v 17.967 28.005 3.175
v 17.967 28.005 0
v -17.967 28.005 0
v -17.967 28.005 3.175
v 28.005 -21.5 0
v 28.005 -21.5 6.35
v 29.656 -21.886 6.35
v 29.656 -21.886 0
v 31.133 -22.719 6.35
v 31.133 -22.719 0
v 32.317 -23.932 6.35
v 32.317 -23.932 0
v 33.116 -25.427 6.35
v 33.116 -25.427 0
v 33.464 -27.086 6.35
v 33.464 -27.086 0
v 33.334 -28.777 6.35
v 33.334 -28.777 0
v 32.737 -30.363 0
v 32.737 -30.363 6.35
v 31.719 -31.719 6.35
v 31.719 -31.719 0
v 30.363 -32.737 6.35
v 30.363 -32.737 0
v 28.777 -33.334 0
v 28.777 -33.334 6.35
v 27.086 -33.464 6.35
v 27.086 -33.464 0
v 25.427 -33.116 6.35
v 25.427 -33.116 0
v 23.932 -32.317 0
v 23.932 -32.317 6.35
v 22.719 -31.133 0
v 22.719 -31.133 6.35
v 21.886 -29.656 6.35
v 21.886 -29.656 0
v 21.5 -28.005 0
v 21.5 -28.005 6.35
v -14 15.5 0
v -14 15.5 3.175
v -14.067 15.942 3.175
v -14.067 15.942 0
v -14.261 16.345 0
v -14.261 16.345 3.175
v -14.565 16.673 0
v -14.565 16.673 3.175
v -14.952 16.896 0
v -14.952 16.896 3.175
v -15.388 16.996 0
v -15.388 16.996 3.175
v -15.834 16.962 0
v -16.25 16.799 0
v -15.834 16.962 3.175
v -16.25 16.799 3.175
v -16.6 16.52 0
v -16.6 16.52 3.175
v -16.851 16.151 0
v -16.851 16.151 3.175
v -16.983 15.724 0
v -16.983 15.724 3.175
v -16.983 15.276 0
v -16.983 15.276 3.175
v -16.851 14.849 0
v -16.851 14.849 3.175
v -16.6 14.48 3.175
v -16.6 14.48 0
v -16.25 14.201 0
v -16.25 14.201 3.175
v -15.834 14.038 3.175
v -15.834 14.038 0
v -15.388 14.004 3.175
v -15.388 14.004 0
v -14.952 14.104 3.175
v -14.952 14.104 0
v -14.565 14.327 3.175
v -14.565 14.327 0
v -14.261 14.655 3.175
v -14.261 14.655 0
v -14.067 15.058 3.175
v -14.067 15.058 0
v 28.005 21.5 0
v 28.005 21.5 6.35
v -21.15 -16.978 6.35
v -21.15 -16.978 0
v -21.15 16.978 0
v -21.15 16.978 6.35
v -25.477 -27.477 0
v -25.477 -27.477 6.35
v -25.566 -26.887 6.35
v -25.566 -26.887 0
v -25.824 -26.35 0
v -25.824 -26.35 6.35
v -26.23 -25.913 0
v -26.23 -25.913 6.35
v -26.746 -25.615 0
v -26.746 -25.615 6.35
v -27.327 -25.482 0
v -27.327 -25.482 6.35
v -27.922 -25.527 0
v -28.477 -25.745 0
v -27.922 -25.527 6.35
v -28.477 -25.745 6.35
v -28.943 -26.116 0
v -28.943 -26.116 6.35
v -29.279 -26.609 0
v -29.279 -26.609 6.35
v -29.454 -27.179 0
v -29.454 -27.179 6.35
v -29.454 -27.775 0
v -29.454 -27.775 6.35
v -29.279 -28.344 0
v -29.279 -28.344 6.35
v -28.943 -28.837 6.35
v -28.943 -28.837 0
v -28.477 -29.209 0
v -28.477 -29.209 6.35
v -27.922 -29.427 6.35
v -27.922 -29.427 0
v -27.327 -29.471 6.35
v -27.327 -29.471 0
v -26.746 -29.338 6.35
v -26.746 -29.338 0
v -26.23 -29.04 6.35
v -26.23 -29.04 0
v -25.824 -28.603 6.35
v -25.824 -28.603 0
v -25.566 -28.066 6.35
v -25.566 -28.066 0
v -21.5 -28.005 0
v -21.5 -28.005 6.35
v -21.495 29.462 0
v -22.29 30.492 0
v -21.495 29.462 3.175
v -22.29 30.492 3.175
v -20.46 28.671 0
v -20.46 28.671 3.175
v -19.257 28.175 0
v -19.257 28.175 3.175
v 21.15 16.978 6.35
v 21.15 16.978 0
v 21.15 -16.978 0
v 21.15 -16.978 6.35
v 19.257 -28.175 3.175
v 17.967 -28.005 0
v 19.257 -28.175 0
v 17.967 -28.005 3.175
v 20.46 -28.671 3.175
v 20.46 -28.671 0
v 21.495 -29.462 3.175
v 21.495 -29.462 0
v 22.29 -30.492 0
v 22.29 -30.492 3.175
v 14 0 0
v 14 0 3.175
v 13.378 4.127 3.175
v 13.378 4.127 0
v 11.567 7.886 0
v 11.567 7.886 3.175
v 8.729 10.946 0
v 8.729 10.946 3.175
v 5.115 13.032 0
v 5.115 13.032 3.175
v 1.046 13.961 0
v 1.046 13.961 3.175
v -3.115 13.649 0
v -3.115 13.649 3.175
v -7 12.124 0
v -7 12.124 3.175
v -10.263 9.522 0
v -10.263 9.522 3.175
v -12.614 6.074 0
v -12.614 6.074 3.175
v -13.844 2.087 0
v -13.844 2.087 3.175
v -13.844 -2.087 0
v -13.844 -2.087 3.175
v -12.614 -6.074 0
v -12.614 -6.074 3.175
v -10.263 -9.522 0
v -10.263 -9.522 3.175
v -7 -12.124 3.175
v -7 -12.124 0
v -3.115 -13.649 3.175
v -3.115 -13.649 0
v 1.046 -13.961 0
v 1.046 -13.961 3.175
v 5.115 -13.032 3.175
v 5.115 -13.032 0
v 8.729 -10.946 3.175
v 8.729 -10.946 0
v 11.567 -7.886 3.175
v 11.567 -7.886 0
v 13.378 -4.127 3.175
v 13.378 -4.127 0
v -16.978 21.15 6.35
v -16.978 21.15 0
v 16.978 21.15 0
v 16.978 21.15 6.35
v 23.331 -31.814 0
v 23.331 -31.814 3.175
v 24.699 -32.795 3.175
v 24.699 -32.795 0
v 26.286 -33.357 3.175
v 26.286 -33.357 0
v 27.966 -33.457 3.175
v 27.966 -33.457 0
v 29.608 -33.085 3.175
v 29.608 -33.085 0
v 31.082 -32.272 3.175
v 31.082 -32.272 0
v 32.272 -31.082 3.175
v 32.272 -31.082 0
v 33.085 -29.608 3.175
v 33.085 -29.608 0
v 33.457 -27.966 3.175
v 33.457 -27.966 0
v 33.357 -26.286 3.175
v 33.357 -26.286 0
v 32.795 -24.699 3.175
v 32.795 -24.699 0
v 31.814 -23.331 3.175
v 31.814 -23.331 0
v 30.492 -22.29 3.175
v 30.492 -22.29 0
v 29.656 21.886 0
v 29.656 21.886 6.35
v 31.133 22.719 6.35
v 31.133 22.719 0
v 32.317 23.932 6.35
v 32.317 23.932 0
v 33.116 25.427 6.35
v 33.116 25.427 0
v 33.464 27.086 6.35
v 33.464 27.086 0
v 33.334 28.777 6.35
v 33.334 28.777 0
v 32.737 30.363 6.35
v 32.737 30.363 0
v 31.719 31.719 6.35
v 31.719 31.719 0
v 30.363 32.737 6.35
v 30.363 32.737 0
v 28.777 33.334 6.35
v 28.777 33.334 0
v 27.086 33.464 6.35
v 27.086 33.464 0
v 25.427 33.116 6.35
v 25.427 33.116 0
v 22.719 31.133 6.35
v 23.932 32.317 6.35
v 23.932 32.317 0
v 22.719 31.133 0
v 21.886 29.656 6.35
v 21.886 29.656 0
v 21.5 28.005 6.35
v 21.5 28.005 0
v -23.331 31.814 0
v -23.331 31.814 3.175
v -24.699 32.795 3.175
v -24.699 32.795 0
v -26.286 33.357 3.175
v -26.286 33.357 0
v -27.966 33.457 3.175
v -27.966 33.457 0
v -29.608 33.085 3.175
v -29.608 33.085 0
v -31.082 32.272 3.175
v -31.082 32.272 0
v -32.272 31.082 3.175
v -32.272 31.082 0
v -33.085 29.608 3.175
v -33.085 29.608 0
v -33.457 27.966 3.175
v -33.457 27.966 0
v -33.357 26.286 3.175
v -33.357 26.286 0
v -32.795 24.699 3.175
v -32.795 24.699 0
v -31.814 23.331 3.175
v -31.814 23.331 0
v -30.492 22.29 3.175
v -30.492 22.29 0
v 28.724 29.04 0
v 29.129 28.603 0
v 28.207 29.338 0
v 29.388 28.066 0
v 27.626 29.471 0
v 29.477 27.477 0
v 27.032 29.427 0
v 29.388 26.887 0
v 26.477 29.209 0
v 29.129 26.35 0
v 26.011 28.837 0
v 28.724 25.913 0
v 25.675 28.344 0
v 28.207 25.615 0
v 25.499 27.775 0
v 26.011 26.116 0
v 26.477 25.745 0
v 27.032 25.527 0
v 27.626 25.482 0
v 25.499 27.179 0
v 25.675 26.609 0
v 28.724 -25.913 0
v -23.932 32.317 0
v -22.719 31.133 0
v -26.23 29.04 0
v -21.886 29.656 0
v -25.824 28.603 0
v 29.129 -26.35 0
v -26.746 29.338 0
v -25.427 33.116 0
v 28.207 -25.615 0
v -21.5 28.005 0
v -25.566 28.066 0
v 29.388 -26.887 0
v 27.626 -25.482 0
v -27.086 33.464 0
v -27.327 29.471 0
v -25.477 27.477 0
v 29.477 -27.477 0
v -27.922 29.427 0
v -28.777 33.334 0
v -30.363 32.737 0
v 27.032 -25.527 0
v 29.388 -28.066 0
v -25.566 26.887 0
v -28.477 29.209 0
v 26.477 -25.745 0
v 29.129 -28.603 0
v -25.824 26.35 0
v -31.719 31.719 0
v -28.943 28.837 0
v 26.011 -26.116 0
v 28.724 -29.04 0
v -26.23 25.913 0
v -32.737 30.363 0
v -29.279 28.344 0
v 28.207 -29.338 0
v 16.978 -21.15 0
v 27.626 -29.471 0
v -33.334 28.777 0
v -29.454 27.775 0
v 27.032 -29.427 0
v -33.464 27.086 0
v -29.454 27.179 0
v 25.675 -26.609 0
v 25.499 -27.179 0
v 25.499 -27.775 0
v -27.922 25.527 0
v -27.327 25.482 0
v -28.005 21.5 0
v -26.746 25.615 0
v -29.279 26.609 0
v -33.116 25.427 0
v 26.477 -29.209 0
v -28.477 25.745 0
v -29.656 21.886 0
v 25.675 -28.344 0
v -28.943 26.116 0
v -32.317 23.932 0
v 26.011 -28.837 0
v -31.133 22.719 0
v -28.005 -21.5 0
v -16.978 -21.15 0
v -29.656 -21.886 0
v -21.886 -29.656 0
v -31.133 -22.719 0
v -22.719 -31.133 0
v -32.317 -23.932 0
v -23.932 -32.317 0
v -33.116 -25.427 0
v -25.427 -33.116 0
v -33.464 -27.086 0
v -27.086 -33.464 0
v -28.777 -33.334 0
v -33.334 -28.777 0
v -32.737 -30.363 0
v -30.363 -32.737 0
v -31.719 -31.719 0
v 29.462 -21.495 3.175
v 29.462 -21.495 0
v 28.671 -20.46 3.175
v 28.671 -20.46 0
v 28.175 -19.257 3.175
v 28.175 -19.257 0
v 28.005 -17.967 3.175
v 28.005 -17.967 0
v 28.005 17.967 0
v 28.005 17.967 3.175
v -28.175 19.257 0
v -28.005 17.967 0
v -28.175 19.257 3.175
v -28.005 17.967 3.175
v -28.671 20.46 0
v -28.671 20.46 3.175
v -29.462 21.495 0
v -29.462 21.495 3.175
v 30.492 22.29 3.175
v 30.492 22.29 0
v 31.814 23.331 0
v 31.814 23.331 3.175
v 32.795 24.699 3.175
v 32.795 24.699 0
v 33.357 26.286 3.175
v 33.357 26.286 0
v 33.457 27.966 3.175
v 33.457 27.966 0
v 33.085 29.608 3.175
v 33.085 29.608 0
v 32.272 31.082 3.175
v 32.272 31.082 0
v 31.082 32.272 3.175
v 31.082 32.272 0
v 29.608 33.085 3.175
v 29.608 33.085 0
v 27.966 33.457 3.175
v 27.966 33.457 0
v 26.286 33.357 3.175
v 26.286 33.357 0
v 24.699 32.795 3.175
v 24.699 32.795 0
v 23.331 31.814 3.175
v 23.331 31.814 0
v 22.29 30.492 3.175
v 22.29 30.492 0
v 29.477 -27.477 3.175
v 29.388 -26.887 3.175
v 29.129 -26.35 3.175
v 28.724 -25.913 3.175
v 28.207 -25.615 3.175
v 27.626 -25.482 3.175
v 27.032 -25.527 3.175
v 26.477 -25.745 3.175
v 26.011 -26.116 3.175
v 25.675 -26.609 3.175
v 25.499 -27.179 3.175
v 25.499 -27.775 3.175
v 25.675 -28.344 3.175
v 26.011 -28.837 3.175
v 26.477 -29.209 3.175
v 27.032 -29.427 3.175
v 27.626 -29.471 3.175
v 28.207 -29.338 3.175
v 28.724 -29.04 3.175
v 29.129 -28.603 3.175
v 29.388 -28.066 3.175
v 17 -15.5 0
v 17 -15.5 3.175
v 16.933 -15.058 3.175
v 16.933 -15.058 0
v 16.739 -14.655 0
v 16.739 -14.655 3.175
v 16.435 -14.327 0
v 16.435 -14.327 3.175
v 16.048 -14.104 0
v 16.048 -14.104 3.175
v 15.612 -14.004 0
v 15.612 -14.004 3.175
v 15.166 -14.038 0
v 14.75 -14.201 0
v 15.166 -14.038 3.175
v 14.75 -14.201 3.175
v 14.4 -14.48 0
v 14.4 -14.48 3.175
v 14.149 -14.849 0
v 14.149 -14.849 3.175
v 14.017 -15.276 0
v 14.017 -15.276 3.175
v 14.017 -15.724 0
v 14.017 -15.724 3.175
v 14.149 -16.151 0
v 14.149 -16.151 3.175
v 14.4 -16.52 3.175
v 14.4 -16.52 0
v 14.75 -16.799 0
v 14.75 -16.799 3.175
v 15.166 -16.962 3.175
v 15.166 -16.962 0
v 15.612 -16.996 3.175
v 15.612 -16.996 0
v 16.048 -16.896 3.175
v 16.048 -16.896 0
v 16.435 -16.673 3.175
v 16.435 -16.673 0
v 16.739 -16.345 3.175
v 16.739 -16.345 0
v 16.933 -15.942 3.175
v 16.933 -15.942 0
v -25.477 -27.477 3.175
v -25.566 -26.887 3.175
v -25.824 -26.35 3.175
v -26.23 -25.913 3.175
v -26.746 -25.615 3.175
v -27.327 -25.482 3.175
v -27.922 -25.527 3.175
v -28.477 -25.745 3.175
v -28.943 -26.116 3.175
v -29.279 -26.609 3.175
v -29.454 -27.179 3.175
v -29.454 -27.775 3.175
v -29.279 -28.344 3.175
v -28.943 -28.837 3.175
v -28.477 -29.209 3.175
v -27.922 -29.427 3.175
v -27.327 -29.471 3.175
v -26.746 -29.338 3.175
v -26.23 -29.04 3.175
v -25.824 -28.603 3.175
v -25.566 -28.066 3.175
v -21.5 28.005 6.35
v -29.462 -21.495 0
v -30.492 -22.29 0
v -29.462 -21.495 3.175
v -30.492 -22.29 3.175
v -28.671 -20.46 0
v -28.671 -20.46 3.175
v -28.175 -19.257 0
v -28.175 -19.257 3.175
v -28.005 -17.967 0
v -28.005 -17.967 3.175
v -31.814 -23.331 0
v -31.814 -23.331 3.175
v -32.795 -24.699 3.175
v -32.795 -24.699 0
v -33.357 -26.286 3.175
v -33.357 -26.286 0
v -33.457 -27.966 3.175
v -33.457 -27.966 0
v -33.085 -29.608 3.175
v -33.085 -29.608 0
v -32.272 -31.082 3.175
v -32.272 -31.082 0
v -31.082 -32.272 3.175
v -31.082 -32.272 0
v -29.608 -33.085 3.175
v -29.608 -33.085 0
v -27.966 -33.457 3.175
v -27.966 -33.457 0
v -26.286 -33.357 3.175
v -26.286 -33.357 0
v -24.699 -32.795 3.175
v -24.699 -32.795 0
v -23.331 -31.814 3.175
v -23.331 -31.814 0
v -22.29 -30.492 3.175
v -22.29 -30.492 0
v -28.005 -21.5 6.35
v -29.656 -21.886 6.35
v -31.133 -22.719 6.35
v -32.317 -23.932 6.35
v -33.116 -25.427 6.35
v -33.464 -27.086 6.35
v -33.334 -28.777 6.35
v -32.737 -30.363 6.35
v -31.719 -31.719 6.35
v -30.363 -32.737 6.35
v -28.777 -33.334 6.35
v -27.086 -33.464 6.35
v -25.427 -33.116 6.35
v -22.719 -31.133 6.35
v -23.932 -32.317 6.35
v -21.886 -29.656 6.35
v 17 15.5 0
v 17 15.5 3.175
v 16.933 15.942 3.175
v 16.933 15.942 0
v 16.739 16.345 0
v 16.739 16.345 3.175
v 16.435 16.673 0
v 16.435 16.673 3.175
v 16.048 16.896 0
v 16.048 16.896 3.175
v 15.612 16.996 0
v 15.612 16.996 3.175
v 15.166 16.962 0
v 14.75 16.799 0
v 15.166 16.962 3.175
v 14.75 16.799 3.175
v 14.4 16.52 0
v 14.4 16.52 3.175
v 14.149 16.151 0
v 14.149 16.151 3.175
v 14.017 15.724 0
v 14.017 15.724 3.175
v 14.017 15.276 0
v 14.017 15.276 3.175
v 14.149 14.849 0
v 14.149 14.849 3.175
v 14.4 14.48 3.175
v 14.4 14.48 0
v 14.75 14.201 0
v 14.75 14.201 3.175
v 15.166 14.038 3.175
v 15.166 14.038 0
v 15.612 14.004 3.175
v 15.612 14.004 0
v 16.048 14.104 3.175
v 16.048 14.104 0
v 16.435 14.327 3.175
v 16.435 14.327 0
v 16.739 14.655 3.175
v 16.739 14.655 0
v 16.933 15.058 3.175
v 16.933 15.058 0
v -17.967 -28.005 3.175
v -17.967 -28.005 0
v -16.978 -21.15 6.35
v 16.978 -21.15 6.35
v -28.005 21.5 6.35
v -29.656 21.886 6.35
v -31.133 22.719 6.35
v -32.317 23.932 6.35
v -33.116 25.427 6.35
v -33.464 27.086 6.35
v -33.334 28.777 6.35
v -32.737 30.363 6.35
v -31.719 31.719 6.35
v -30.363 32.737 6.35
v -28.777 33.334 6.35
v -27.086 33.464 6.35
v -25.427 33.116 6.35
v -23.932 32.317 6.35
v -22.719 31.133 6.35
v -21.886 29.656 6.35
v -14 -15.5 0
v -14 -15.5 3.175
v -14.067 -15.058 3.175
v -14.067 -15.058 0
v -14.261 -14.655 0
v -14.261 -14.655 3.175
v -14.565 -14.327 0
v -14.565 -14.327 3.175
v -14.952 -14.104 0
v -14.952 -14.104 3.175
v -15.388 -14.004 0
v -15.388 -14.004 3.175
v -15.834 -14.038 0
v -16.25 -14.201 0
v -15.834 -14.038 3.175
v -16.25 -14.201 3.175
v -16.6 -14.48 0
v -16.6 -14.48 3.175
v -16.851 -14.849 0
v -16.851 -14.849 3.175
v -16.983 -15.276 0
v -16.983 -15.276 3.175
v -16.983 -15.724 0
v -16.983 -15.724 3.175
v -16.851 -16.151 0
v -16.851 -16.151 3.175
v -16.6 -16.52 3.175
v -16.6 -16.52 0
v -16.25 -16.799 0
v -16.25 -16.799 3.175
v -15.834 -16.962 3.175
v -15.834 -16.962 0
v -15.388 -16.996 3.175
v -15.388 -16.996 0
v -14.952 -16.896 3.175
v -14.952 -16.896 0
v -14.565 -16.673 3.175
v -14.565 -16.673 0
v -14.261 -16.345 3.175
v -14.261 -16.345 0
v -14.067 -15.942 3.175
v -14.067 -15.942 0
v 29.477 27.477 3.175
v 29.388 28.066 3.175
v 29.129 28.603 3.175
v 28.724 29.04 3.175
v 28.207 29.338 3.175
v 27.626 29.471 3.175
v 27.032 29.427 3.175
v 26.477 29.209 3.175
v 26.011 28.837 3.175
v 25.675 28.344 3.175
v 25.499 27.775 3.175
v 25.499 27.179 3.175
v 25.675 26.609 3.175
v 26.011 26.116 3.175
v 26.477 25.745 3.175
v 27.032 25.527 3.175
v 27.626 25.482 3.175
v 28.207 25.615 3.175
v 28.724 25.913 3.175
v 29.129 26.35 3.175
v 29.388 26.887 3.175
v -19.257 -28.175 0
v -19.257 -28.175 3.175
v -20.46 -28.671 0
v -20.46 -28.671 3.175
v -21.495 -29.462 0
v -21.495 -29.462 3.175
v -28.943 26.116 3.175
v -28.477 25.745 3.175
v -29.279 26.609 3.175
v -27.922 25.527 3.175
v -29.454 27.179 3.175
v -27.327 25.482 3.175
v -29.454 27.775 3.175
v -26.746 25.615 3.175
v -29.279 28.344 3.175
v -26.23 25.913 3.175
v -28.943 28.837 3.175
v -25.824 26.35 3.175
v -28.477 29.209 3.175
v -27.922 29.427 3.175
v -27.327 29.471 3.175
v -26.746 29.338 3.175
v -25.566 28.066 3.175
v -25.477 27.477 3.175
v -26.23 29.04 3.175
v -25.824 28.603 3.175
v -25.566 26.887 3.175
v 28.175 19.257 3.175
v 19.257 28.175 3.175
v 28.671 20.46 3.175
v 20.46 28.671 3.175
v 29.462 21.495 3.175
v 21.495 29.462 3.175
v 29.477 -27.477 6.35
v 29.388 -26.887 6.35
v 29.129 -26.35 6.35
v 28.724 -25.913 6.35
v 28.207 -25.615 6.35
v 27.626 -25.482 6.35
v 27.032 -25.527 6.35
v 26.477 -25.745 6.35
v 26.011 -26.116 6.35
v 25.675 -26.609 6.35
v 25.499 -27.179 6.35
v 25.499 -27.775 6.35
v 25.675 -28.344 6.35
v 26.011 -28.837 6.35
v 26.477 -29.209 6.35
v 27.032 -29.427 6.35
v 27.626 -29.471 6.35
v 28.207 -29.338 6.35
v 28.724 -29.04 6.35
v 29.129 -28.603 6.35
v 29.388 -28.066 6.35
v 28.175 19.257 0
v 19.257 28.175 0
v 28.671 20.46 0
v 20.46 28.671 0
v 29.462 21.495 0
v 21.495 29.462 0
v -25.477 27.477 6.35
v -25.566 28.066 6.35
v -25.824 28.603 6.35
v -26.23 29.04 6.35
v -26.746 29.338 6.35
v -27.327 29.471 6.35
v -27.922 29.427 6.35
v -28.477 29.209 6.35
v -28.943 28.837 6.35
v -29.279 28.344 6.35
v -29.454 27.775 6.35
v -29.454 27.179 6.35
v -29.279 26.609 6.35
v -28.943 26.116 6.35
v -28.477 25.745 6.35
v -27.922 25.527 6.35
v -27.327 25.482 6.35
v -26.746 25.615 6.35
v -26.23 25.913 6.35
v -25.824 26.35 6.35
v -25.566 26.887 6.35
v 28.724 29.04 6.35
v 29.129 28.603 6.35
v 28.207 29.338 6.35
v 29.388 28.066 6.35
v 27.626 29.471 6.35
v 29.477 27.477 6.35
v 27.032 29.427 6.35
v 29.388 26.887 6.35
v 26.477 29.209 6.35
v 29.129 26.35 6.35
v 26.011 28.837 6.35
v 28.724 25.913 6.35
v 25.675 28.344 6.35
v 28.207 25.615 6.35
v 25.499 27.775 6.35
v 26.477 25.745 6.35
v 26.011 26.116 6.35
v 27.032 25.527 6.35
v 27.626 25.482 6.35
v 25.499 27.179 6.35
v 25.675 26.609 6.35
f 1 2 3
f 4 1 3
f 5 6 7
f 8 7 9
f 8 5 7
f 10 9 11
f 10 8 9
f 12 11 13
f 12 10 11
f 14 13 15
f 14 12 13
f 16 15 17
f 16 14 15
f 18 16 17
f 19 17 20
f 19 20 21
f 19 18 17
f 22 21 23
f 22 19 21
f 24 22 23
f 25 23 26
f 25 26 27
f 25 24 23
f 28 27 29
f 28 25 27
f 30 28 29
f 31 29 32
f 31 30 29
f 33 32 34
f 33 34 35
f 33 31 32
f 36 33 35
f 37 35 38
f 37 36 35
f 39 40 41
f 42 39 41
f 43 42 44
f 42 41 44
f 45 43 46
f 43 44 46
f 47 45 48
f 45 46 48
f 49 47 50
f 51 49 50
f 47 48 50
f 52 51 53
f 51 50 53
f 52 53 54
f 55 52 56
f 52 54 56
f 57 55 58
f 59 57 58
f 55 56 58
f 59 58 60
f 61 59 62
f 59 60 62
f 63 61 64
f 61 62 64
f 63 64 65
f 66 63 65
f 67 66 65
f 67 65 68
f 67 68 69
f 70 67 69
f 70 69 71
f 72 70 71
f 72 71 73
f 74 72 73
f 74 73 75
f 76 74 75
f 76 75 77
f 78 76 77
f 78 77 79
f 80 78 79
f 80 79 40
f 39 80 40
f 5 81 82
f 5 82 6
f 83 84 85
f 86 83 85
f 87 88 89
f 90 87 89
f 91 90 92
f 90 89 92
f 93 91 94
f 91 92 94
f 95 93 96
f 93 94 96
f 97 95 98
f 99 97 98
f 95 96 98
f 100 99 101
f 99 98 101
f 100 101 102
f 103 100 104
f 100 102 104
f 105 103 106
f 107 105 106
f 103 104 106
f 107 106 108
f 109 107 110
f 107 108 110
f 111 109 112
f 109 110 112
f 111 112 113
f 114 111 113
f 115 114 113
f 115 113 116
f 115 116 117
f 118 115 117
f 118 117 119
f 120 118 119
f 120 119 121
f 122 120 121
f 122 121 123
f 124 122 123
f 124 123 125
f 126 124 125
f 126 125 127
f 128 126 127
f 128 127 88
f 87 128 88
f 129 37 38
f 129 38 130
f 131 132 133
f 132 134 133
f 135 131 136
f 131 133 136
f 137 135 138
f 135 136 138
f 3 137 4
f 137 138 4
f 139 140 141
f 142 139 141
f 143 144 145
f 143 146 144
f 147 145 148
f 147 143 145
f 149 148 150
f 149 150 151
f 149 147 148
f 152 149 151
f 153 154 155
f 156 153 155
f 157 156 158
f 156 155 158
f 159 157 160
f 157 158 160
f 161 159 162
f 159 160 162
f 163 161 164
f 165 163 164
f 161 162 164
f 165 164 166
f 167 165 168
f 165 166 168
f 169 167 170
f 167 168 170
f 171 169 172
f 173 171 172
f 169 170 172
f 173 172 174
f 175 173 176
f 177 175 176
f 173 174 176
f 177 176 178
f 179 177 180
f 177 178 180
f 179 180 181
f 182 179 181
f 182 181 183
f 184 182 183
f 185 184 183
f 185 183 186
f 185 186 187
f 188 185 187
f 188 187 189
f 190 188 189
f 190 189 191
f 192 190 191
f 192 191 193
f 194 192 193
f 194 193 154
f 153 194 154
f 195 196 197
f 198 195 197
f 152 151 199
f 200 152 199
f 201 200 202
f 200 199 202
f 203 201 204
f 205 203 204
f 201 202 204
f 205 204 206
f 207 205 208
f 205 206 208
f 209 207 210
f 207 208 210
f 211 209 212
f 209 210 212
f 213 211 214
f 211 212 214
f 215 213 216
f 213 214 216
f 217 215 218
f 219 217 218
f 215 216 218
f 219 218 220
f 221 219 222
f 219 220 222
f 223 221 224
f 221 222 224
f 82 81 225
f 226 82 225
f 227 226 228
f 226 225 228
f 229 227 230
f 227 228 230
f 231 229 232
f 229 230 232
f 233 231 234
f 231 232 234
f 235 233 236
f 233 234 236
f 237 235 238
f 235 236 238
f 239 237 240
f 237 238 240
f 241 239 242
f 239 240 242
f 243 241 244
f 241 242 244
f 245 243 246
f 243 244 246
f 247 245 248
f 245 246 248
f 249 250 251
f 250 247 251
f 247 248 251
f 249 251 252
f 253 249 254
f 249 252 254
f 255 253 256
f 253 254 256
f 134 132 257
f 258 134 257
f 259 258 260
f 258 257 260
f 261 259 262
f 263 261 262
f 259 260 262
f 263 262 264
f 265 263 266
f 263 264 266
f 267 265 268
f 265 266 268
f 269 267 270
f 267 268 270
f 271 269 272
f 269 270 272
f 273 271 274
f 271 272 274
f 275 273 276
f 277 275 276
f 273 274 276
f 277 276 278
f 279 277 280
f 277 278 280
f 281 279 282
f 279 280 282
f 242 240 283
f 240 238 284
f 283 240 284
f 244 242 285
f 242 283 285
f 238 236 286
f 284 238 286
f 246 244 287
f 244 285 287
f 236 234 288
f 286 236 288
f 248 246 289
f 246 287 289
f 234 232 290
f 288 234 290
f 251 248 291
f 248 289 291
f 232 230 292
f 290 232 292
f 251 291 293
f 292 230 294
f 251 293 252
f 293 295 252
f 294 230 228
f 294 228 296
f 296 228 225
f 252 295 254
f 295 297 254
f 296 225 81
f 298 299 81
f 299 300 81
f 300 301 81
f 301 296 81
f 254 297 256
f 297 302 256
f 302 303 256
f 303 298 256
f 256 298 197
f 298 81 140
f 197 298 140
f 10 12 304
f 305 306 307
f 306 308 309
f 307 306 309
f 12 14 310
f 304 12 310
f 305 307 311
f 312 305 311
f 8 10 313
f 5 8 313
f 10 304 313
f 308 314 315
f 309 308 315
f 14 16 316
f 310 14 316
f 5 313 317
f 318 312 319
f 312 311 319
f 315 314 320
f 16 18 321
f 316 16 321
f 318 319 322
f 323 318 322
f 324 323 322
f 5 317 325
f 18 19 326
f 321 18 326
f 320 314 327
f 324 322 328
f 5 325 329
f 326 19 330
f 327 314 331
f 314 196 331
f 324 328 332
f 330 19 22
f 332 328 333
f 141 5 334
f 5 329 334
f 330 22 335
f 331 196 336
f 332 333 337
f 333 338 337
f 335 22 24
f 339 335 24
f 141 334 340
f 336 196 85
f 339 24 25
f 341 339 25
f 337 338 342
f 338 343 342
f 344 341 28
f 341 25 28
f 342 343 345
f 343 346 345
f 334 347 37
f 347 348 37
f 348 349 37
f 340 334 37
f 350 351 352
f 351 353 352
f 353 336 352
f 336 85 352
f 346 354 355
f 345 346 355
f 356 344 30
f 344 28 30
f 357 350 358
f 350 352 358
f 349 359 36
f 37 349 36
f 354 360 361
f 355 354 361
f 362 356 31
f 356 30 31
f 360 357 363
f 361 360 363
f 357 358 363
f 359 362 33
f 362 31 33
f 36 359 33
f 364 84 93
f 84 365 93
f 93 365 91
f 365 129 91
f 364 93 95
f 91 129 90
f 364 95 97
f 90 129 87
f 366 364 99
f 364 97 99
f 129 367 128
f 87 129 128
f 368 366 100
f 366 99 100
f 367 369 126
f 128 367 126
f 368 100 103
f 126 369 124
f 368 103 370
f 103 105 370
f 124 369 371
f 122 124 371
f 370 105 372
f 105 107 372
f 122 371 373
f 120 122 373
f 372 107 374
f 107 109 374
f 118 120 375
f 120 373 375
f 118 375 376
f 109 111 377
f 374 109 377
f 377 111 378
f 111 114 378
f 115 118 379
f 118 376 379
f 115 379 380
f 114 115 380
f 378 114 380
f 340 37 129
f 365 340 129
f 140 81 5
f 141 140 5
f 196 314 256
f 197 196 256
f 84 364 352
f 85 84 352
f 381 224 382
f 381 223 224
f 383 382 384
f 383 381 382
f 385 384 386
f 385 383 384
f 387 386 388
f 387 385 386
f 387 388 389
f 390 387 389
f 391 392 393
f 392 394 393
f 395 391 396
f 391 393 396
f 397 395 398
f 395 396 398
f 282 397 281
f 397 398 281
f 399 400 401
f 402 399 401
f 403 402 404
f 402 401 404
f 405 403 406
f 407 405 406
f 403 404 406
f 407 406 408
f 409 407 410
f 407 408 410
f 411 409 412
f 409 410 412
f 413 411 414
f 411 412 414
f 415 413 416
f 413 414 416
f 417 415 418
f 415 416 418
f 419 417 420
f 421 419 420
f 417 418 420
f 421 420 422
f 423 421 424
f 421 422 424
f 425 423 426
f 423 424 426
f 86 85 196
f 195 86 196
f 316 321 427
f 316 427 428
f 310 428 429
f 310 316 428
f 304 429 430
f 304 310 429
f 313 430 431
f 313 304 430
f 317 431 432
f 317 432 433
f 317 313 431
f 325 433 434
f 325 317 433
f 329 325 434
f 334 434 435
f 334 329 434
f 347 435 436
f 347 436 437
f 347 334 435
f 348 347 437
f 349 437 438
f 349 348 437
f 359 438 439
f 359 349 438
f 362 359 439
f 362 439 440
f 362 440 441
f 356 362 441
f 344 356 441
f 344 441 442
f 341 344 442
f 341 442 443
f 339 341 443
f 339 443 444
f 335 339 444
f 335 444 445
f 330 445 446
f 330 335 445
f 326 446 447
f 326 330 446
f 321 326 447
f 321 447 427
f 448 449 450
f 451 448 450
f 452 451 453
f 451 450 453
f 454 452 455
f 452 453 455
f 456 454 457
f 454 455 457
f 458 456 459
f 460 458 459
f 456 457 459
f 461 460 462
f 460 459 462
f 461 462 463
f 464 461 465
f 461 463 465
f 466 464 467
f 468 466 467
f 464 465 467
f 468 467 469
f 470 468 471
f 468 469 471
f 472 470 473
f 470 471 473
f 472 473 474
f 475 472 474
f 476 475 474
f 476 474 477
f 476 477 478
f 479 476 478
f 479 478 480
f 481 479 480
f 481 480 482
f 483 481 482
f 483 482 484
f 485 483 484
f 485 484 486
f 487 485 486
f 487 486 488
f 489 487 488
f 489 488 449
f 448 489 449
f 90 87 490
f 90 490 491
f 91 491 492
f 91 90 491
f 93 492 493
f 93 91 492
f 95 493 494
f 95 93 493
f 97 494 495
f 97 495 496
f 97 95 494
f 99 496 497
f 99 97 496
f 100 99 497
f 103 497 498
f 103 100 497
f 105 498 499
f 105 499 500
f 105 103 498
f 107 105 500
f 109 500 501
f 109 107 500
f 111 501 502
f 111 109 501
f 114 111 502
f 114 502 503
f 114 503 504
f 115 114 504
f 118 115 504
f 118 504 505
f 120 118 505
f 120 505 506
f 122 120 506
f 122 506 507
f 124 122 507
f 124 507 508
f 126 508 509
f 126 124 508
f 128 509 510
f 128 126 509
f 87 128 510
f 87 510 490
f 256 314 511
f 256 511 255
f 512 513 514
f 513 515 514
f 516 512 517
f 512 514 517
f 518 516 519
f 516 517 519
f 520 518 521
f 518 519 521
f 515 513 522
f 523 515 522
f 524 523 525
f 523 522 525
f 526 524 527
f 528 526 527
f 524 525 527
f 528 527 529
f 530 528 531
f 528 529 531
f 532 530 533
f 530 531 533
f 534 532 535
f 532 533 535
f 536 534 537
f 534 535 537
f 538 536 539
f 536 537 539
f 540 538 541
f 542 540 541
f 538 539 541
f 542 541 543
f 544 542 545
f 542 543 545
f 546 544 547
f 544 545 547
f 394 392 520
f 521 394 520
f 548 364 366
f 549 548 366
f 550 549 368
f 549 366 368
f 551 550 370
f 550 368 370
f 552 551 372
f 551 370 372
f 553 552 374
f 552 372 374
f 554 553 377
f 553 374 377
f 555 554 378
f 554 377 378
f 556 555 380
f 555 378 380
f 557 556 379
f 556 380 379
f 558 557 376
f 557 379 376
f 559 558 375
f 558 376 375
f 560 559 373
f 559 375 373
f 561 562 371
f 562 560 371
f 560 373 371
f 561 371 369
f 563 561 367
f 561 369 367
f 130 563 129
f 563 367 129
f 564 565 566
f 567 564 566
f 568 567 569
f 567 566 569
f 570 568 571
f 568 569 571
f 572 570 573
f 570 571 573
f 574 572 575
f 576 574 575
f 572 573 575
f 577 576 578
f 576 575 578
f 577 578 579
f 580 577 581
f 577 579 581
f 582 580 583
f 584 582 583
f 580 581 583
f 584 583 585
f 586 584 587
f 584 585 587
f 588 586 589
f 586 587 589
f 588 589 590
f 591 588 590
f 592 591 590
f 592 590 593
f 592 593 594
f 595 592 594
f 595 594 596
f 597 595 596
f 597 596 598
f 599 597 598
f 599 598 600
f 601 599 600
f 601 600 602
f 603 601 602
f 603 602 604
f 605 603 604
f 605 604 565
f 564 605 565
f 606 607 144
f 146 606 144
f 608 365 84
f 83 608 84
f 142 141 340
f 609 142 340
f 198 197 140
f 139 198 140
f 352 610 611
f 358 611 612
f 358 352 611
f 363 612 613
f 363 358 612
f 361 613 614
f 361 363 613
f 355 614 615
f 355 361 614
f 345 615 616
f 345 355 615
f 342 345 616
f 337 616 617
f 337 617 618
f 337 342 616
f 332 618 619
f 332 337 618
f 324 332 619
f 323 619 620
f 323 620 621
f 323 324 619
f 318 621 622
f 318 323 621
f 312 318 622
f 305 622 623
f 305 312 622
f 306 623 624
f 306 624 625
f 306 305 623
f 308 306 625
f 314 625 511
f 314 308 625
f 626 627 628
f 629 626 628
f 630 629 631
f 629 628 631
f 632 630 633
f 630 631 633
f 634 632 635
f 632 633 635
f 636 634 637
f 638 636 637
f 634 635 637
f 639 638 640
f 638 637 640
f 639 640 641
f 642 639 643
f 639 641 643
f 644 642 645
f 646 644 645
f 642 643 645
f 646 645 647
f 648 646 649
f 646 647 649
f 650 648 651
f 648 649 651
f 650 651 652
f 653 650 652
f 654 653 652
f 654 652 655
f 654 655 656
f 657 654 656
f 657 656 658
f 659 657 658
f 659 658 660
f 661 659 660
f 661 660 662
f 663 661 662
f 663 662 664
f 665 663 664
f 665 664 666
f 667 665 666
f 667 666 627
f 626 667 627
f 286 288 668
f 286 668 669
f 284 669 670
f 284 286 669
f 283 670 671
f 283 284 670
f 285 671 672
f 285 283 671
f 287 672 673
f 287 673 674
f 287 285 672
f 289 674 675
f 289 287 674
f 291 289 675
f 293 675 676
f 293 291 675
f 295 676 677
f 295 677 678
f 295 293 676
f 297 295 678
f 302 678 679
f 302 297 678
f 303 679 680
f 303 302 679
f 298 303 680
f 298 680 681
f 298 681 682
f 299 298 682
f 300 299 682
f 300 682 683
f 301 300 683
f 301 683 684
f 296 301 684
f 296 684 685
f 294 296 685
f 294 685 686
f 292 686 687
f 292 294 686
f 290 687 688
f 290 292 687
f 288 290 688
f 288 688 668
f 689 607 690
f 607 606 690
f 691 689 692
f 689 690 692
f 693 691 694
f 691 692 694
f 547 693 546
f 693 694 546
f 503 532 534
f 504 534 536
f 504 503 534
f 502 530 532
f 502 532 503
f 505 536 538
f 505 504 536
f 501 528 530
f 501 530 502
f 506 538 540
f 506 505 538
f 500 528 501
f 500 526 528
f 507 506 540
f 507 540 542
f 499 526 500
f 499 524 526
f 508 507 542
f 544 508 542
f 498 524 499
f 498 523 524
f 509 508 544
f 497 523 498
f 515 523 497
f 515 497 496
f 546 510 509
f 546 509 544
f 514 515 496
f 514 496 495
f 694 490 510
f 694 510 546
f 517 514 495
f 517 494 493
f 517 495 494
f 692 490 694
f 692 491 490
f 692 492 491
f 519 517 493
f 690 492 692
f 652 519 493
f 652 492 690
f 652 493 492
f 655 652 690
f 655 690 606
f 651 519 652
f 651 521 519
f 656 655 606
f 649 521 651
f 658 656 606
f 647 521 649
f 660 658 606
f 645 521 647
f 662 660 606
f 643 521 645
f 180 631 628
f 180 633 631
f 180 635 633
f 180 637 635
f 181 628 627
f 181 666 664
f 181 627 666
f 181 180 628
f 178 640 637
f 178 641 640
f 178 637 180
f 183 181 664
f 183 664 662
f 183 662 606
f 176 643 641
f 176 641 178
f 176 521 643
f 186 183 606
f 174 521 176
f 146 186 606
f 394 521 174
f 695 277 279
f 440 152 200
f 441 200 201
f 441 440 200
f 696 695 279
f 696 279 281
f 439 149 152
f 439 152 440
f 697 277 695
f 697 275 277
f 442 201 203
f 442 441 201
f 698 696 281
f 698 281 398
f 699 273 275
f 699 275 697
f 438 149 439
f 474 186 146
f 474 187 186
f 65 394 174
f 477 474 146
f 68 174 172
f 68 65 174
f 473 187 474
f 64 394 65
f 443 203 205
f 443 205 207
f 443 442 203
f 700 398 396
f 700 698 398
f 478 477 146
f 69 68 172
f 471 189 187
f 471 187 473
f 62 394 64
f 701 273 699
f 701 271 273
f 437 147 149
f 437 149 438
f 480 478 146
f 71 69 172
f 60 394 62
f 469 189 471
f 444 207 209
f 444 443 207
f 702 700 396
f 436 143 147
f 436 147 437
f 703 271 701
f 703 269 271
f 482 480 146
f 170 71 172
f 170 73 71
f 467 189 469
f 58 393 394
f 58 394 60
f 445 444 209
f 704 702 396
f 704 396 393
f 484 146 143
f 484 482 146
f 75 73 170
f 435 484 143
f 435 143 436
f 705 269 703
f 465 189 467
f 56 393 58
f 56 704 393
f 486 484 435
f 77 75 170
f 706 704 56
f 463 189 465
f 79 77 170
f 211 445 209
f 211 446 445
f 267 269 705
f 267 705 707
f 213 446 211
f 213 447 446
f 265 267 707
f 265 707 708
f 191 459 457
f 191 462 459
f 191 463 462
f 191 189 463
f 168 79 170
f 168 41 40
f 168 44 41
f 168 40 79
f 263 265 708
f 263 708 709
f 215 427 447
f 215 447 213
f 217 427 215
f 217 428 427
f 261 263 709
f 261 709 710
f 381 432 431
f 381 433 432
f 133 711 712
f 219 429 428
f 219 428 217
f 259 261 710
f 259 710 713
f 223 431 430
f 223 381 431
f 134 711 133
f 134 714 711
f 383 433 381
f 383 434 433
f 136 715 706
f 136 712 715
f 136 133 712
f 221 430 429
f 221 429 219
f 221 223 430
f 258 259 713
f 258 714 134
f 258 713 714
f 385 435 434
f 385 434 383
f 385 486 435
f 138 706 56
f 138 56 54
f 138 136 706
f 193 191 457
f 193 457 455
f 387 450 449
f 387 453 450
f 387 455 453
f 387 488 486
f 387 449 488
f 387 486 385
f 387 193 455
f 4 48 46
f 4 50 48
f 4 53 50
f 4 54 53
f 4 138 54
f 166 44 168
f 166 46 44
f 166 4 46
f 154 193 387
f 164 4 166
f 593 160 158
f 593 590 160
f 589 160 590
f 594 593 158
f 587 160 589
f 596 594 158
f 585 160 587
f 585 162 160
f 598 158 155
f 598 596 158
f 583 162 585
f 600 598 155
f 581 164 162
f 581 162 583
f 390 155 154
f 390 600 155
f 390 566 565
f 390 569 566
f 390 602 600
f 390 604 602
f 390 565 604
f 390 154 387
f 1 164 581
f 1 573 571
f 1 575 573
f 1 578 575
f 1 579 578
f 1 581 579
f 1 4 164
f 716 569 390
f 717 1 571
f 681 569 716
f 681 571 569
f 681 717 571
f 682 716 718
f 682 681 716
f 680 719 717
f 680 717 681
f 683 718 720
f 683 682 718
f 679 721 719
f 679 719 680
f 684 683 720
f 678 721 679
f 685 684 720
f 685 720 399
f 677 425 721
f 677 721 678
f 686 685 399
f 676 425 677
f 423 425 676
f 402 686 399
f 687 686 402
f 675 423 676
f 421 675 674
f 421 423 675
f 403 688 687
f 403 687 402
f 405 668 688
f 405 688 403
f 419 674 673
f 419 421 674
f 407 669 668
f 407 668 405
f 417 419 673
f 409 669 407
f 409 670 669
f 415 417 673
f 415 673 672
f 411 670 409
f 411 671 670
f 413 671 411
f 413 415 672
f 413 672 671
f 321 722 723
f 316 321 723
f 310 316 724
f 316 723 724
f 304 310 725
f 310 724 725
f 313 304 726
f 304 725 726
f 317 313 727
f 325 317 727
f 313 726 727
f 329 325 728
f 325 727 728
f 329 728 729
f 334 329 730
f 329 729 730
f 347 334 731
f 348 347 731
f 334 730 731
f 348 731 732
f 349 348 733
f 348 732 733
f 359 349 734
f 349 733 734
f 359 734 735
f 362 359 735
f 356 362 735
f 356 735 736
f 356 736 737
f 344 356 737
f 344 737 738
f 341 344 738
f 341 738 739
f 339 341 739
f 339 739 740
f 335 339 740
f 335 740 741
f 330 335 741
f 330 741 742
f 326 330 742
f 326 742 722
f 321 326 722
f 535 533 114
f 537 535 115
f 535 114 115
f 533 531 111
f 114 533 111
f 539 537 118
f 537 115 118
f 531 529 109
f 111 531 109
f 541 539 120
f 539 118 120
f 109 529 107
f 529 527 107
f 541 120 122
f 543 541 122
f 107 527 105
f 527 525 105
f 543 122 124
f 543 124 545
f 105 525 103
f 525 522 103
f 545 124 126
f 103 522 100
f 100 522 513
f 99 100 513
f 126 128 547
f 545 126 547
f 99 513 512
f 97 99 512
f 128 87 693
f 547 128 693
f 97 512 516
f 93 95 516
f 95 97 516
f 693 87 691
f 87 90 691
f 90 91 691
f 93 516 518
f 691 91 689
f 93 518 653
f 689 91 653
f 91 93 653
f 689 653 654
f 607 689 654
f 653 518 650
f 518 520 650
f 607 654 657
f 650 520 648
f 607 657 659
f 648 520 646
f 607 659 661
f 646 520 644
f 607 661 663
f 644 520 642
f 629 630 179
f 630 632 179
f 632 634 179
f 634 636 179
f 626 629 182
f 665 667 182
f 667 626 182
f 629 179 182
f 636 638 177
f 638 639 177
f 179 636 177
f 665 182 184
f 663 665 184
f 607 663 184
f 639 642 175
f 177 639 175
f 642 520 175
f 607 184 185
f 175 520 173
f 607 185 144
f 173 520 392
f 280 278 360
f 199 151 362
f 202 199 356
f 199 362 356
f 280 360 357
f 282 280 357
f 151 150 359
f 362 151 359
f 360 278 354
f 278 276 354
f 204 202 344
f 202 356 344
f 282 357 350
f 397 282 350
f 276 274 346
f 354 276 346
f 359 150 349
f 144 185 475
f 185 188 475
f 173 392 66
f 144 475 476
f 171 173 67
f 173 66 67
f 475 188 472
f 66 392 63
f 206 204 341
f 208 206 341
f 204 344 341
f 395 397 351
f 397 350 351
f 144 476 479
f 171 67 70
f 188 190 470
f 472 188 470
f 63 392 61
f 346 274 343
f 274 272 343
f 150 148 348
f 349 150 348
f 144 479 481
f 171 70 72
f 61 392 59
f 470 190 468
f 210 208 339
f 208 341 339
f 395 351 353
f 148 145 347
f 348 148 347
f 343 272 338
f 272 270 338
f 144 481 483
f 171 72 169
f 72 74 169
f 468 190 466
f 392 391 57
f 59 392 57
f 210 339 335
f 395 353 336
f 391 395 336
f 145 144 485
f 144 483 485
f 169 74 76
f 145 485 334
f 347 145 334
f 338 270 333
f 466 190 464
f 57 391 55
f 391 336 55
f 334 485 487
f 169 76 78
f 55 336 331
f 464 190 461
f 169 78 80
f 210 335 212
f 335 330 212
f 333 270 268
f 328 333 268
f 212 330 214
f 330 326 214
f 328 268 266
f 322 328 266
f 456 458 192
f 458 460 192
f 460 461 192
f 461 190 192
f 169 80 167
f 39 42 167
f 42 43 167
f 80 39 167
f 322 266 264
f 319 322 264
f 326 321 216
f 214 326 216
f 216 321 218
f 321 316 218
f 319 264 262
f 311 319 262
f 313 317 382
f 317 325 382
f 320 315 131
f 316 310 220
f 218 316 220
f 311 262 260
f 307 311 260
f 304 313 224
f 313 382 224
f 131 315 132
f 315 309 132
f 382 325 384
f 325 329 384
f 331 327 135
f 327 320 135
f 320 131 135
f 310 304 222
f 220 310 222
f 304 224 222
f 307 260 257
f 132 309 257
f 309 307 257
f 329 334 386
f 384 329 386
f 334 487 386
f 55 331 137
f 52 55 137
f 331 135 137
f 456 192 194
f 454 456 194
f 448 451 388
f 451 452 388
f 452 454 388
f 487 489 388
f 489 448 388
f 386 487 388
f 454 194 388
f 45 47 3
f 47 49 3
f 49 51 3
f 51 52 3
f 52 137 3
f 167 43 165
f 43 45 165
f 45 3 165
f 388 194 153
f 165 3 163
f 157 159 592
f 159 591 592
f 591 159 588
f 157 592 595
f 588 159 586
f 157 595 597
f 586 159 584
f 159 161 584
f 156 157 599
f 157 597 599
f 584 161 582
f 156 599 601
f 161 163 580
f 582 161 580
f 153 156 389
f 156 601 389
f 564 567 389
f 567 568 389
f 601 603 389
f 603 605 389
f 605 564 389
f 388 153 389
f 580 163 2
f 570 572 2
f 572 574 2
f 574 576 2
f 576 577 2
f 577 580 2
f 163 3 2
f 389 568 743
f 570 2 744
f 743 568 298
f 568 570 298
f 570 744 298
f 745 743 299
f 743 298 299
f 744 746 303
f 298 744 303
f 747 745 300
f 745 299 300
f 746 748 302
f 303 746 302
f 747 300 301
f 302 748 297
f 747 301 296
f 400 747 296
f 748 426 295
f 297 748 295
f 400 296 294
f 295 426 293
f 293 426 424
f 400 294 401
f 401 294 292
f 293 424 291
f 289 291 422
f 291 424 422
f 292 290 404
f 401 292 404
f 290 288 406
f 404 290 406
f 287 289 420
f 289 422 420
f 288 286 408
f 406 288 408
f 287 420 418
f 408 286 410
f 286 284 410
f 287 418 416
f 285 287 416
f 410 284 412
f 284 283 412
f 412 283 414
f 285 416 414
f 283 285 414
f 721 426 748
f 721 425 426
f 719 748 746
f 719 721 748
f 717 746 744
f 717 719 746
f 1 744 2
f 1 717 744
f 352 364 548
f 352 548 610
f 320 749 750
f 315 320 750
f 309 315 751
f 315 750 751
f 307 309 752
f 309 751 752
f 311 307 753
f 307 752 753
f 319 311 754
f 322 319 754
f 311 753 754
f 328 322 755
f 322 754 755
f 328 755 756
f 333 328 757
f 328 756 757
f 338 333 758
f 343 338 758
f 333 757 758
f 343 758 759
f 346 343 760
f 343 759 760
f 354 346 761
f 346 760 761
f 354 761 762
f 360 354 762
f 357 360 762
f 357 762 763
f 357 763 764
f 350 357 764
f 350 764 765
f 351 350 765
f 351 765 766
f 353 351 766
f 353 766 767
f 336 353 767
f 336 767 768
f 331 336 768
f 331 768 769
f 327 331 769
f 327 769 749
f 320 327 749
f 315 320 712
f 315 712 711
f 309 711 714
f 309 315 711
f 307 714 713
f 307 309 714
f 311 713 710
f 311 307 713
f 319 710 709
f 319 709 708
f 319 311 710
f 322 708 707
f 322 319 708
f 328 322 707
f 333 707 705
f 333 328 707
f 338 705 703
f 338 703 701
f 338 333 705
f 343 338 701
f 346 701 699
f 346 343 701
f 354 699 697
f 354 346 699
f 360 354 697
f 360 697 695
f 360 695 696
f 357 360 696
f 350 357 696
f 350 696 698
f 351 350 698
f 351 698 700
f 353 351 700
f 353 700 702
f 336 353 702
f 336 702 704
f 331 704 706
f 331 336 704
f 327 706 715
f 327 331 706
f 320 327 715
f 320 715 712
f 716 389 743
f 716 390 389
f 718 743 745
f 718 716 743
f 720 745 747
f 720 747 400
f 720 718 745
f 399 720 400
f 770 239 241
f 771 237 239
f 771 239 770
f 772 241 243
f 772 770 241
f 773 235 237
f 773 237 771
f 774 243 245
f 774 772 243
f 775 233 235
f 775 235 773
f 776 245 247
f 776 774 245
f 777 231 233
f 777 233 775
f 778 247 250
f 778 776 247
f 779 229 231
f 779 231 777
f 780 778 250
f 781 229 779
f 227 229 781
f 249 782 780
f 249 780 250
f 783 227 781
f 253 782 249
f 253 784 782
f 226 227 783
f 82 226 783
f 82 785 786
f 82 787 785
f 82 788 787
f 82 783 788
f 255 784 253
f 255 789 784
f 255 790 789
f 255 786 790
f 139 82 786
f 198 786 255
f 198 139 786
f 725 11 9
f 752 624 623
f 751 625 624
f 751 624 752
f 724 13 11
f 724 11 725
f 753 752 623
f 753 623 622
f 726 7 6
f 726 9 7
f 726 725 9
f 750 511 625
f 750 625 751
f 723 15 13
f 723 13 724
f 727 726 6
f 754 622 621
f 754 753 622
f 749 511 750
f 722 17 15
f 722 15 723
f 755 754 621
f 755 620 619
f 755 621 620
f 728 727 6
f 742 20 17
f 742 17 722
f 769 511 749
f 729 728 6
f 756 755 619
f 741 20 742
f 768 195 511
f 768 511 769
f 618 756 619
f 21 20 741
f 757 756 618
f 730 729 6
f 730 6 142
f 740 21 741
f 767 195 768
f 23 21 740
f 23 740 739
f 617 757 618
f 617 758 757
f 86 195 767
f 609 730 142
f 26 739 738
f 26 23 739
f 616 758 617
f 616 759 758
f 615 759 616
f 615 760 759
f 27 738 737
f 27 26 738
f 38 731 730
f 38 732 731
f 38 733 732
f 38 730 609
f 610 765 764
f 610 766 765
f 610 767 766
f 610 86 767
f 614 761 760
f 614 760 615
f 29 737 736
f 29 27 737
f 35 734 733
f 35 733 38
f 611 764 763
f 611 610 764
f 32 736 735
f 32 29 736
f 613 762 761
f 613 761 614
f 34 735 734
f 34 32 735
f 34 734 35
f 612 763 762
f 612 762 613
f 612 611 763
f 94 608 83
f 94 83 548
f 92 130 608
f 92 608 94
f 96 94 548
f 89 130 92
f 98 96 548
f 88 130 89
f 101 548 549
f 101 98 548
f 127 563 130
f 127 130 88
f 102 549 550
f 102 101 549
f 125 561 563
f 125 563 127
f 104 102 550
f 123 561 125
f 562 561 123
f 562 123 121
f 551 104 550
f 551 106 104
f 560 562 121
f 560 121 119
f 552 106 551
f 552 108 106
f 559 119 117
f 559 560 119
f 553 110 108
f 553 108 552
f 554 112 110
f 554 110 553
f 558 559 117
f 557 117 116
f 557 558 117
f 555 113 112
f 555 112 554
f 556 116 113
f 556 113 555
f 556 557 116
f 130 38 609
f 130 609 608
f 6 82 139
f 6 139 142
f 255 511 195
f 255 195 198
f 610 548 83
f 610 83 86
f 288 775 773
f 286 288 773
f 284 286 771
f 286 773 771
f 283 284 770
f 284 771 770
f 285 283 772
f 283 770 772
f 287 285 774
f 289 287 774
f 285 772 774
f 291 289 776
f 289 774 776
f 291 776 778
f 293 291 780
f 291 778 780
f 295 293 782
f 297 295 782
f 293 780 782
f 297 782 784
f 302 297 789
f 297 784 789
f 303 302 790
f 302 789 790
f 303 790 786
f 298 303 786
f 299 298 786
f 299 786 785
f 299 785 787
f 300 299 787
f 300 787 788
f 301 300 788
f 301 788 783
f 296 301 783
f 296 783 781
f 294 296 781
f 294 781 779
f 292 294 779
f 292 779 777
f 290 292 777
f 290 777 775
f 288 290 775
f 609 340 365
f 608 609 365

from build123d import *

# Parameters (mm, degrees)
BOSS_EXTRU_2_DEPTH        = 6.35
ESQUISSE29_R              = 6
BOSS_EXTRU_3_DEPTH        = 6.35
SYM_TRIE2_COPY_1_SKETCH_R = 6
SYM_TRIE2_COPY_1_DEPTH    = 6.35
ESQUISSE30_R              = 2
ENL_V_MAT_EXTRU_1_DEPTH   = 48.7671004
ESQUISSE31_R              = 2
BOSS_EXTRU_4_DEPTH        = 3.175
ESQUISSE32_R              = 1.5
ESQUISSE32_R_2            = 14
ENL_V_MAT_EXTRU_2_DEPTH   = 48.449488992
CONG_1_R                  = 5


with BuildPart() as part:
    # Esquisse28 → Boss.-Extru.2 (new body)
    with BuildSketch(Plane.XY):
        Polygon((-21.5, -28.005382387), (-28.005382387, -21.5), (-28.005382387, 21.5), (-21.5, 28.005382387), (21.5, 28.005382387), (28.005382387, 21.5), (28.005382387, -21.5), (21.5, -28.005382387), align=None)
        Polygon((-16.978069991, -21.15), (-21.15, -16.978069991), (-21.15, 16.978069991), (-16.978069991, 21.15), (16.978069991, 21.15), (21.15, 16.978069991), (21.15, -16.978069991), (16.978069991, -21.15), align=None, mode=Mode.SUBTRACT)
    extrude(amount=BOSS_EXTRU_2_DEPTH)

    # Esquisse29 → Boss.-Extru.3 (add)
    with BuildSketch(Plane.XY):
        with Locations((27.476658888, 27.476658888)):
            Circle(ESQUISSE29_R)
    boss_extru_3 = extrude(amount=BOSS_EXTRU_3_DEPTH)

    # Symétrie1: Boss.-Extru.3 across plane
    add(boss_extru_3.mirror(Plane(origin=(0, 0, 0), x_dir=(0, 0, 1), z_dir=(1, 0, 0))))

    # Symétrie2: Boss.-Extru.3 across plane
    add(boss_extru_3.mirror(Plane.ZX))

    # Symétrie2 copy 1 sketch → Symétrie2 copy 1 (add)
    with BuildSketch(Plane(origin=(0, 0, 0), x_dir=(-1, 0, 0), z_dir=(0, 0, 1))):
        with Locations((27.476658888, 27.476658888)):
            Circle(SYM_TRIE2_COPY_1_SKETCH_R)
    extrude(amount=SYM_TRIE2_COPY_1_DEPTH)

    # Esquisse30 → Enlèv. mat.-Extru.1 (cut, through all)
    with BuildSketch(Plane.XY.offset(6.35)):
        with Locations((-27.476658888, 27.476658888)):
            Circle(ESQUISSE30_R)
        with Locations((27.476658888, 27.476658888)):
            Circle(ESQUISSE30_R)
        with Locations((27.476658888, -27.476658888)):
            Circle(ESQUISSE30_R)
        with Locations((-27.476658888, -27.476658888)):
            Circle(ESQUISSE30_R)
    extrude(amount=-ENL_V_MAT_EXTRU_1_DEPTH, mode=Mode.SUBTRACT)


with BuildPart() as body_2:
    # Esquisse31 → Boss.-Extru.4 (new body)
    with BuildSketch(Plane.XY):
        with BuildLine():
            Line((-21.5, -28.005382387), (21.5, -28.005382387))
            ThreePointArc((21.5, -28.005382387), (31.719299575, -31.719299575), (28.005382387, -21.5))
            Line((28.005382387, -21.5), (28.005382387, 21.5))
            ThreePointArc((28.005382387, 21.5), (31.719299575, 31.719299575), (21.5, 28.005382387))
            Line((21.5, 28.005382387), (-21.5, 28.005382387))
            ThreePointArc((-21.5, 28.005382387), (-31.719299575, 31.719299575), (-28.005382387, 21.5))
            Line((-28.005382387, 21.5), (-28.005382387, -21.5))
            ThreePointArc((-28.005382387, -21.5), (-31.719299575, -31.719299575), (-21.5, -28.005382387))
        make_face()
        with Locations((27.476658888, 27.476658888)):
            Circle(ESQUISSE31_R, mode=Mode.SUBTRACT)
        with Locations((-27.476658888, 27.476658888)):
            Circle(ESQUISSE31_R, mode=Mode.SUBTRACT)
        with Locations((-27.476658888, -27.476658888)):
            Circle(ESQUISSE31_R, mode=Mode.SUBTRACT)
        with Locations((27.476658888, -27.476658888)):
            Circle(ESQUISSE31_R, mode=Mode.SUBTRACT)
    extrude(amount=BOSS_EXTRU_4_DEPTH)

    # Esquisse32 → Enlèv. mat.-Extru.2 (cut, through all)
    with BuildSketch(Plane.XY.offset(3.175)):
        with Locations((-15.5, -15.5)):
            Circle(ESQUISSE32_R)
        with Locations((15.5, -15.5)):
            Circle(ESQUISSE32_R)
        with Locations((15.5, 15.5)):
            Circle(ESQUISSE32_R)
        with Locations((-15.5, 15.5)):
            Circle(ESQUISSE32_R)
        Circle(ESQUISSE32_R_2)
    extrude(amount=-ENL_V_MAT_EXTRU_2_DEPTH, mode=Mode.SUBTRACT)

    # Congé1
    cong_1_edges = [body_2.edges().sort_by_distance(p)[0] for p in [
        (-28.005382387, -21.5, 1.5875),
        (-28.005382387, 21.5, 1.5875),
        (-21.5, 28.005382387, 1.5875),
        (21.5, 28.005382387, 1.5875),
        (28.005382387, 21.5, 1.5875),
        (28.005382387, -21.5, 1.5875),
        (21.5, -28.005382387, 1.5875),
        (-21.5, -28.005382387, 1.5875),
    ]]
    fillet(cong_1_edges, radius=CONG_1_R)


solid = Compound([part.part, body_2.part])
